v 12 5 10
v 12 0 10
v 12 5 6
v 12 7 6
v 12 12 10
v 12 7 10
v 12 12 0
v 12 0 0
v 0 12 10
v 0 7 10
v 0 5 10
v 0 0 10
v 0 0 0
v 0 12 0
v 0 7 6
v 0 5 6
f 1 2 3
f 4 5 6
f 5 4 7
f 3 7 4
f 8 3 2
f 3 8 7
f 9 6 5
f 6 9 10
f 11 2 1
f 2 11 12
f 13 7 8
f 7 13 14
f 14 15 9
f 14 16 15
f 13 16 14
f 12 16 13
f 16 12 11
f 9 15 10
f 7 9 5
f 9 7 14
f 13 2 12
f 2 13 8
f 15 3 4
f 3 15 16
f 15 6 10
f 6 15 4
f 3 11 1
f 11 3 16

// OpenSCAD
$fn = 32;

// ----------------------------------------------------------------------
// Micro clip: slotted block, 5-20 mm class
// ----------------------------------------------------------------------

// --- parameters (mm) ---
block_l = 12;             // block length, X
block_w = 12;             // block width, Y
block_h = 10;             // block height, Z
slot_w = 2;               // slot width
slot_d = 4;               // slot depth from the top

difference() {
  cube([block_l, block_w, block_h]);
  translate([-1, block_w / 2 - slot_w / 2, block_h - slot_d])
    cube([block_l + 2, slot_w, slot_d + 1]);
}
